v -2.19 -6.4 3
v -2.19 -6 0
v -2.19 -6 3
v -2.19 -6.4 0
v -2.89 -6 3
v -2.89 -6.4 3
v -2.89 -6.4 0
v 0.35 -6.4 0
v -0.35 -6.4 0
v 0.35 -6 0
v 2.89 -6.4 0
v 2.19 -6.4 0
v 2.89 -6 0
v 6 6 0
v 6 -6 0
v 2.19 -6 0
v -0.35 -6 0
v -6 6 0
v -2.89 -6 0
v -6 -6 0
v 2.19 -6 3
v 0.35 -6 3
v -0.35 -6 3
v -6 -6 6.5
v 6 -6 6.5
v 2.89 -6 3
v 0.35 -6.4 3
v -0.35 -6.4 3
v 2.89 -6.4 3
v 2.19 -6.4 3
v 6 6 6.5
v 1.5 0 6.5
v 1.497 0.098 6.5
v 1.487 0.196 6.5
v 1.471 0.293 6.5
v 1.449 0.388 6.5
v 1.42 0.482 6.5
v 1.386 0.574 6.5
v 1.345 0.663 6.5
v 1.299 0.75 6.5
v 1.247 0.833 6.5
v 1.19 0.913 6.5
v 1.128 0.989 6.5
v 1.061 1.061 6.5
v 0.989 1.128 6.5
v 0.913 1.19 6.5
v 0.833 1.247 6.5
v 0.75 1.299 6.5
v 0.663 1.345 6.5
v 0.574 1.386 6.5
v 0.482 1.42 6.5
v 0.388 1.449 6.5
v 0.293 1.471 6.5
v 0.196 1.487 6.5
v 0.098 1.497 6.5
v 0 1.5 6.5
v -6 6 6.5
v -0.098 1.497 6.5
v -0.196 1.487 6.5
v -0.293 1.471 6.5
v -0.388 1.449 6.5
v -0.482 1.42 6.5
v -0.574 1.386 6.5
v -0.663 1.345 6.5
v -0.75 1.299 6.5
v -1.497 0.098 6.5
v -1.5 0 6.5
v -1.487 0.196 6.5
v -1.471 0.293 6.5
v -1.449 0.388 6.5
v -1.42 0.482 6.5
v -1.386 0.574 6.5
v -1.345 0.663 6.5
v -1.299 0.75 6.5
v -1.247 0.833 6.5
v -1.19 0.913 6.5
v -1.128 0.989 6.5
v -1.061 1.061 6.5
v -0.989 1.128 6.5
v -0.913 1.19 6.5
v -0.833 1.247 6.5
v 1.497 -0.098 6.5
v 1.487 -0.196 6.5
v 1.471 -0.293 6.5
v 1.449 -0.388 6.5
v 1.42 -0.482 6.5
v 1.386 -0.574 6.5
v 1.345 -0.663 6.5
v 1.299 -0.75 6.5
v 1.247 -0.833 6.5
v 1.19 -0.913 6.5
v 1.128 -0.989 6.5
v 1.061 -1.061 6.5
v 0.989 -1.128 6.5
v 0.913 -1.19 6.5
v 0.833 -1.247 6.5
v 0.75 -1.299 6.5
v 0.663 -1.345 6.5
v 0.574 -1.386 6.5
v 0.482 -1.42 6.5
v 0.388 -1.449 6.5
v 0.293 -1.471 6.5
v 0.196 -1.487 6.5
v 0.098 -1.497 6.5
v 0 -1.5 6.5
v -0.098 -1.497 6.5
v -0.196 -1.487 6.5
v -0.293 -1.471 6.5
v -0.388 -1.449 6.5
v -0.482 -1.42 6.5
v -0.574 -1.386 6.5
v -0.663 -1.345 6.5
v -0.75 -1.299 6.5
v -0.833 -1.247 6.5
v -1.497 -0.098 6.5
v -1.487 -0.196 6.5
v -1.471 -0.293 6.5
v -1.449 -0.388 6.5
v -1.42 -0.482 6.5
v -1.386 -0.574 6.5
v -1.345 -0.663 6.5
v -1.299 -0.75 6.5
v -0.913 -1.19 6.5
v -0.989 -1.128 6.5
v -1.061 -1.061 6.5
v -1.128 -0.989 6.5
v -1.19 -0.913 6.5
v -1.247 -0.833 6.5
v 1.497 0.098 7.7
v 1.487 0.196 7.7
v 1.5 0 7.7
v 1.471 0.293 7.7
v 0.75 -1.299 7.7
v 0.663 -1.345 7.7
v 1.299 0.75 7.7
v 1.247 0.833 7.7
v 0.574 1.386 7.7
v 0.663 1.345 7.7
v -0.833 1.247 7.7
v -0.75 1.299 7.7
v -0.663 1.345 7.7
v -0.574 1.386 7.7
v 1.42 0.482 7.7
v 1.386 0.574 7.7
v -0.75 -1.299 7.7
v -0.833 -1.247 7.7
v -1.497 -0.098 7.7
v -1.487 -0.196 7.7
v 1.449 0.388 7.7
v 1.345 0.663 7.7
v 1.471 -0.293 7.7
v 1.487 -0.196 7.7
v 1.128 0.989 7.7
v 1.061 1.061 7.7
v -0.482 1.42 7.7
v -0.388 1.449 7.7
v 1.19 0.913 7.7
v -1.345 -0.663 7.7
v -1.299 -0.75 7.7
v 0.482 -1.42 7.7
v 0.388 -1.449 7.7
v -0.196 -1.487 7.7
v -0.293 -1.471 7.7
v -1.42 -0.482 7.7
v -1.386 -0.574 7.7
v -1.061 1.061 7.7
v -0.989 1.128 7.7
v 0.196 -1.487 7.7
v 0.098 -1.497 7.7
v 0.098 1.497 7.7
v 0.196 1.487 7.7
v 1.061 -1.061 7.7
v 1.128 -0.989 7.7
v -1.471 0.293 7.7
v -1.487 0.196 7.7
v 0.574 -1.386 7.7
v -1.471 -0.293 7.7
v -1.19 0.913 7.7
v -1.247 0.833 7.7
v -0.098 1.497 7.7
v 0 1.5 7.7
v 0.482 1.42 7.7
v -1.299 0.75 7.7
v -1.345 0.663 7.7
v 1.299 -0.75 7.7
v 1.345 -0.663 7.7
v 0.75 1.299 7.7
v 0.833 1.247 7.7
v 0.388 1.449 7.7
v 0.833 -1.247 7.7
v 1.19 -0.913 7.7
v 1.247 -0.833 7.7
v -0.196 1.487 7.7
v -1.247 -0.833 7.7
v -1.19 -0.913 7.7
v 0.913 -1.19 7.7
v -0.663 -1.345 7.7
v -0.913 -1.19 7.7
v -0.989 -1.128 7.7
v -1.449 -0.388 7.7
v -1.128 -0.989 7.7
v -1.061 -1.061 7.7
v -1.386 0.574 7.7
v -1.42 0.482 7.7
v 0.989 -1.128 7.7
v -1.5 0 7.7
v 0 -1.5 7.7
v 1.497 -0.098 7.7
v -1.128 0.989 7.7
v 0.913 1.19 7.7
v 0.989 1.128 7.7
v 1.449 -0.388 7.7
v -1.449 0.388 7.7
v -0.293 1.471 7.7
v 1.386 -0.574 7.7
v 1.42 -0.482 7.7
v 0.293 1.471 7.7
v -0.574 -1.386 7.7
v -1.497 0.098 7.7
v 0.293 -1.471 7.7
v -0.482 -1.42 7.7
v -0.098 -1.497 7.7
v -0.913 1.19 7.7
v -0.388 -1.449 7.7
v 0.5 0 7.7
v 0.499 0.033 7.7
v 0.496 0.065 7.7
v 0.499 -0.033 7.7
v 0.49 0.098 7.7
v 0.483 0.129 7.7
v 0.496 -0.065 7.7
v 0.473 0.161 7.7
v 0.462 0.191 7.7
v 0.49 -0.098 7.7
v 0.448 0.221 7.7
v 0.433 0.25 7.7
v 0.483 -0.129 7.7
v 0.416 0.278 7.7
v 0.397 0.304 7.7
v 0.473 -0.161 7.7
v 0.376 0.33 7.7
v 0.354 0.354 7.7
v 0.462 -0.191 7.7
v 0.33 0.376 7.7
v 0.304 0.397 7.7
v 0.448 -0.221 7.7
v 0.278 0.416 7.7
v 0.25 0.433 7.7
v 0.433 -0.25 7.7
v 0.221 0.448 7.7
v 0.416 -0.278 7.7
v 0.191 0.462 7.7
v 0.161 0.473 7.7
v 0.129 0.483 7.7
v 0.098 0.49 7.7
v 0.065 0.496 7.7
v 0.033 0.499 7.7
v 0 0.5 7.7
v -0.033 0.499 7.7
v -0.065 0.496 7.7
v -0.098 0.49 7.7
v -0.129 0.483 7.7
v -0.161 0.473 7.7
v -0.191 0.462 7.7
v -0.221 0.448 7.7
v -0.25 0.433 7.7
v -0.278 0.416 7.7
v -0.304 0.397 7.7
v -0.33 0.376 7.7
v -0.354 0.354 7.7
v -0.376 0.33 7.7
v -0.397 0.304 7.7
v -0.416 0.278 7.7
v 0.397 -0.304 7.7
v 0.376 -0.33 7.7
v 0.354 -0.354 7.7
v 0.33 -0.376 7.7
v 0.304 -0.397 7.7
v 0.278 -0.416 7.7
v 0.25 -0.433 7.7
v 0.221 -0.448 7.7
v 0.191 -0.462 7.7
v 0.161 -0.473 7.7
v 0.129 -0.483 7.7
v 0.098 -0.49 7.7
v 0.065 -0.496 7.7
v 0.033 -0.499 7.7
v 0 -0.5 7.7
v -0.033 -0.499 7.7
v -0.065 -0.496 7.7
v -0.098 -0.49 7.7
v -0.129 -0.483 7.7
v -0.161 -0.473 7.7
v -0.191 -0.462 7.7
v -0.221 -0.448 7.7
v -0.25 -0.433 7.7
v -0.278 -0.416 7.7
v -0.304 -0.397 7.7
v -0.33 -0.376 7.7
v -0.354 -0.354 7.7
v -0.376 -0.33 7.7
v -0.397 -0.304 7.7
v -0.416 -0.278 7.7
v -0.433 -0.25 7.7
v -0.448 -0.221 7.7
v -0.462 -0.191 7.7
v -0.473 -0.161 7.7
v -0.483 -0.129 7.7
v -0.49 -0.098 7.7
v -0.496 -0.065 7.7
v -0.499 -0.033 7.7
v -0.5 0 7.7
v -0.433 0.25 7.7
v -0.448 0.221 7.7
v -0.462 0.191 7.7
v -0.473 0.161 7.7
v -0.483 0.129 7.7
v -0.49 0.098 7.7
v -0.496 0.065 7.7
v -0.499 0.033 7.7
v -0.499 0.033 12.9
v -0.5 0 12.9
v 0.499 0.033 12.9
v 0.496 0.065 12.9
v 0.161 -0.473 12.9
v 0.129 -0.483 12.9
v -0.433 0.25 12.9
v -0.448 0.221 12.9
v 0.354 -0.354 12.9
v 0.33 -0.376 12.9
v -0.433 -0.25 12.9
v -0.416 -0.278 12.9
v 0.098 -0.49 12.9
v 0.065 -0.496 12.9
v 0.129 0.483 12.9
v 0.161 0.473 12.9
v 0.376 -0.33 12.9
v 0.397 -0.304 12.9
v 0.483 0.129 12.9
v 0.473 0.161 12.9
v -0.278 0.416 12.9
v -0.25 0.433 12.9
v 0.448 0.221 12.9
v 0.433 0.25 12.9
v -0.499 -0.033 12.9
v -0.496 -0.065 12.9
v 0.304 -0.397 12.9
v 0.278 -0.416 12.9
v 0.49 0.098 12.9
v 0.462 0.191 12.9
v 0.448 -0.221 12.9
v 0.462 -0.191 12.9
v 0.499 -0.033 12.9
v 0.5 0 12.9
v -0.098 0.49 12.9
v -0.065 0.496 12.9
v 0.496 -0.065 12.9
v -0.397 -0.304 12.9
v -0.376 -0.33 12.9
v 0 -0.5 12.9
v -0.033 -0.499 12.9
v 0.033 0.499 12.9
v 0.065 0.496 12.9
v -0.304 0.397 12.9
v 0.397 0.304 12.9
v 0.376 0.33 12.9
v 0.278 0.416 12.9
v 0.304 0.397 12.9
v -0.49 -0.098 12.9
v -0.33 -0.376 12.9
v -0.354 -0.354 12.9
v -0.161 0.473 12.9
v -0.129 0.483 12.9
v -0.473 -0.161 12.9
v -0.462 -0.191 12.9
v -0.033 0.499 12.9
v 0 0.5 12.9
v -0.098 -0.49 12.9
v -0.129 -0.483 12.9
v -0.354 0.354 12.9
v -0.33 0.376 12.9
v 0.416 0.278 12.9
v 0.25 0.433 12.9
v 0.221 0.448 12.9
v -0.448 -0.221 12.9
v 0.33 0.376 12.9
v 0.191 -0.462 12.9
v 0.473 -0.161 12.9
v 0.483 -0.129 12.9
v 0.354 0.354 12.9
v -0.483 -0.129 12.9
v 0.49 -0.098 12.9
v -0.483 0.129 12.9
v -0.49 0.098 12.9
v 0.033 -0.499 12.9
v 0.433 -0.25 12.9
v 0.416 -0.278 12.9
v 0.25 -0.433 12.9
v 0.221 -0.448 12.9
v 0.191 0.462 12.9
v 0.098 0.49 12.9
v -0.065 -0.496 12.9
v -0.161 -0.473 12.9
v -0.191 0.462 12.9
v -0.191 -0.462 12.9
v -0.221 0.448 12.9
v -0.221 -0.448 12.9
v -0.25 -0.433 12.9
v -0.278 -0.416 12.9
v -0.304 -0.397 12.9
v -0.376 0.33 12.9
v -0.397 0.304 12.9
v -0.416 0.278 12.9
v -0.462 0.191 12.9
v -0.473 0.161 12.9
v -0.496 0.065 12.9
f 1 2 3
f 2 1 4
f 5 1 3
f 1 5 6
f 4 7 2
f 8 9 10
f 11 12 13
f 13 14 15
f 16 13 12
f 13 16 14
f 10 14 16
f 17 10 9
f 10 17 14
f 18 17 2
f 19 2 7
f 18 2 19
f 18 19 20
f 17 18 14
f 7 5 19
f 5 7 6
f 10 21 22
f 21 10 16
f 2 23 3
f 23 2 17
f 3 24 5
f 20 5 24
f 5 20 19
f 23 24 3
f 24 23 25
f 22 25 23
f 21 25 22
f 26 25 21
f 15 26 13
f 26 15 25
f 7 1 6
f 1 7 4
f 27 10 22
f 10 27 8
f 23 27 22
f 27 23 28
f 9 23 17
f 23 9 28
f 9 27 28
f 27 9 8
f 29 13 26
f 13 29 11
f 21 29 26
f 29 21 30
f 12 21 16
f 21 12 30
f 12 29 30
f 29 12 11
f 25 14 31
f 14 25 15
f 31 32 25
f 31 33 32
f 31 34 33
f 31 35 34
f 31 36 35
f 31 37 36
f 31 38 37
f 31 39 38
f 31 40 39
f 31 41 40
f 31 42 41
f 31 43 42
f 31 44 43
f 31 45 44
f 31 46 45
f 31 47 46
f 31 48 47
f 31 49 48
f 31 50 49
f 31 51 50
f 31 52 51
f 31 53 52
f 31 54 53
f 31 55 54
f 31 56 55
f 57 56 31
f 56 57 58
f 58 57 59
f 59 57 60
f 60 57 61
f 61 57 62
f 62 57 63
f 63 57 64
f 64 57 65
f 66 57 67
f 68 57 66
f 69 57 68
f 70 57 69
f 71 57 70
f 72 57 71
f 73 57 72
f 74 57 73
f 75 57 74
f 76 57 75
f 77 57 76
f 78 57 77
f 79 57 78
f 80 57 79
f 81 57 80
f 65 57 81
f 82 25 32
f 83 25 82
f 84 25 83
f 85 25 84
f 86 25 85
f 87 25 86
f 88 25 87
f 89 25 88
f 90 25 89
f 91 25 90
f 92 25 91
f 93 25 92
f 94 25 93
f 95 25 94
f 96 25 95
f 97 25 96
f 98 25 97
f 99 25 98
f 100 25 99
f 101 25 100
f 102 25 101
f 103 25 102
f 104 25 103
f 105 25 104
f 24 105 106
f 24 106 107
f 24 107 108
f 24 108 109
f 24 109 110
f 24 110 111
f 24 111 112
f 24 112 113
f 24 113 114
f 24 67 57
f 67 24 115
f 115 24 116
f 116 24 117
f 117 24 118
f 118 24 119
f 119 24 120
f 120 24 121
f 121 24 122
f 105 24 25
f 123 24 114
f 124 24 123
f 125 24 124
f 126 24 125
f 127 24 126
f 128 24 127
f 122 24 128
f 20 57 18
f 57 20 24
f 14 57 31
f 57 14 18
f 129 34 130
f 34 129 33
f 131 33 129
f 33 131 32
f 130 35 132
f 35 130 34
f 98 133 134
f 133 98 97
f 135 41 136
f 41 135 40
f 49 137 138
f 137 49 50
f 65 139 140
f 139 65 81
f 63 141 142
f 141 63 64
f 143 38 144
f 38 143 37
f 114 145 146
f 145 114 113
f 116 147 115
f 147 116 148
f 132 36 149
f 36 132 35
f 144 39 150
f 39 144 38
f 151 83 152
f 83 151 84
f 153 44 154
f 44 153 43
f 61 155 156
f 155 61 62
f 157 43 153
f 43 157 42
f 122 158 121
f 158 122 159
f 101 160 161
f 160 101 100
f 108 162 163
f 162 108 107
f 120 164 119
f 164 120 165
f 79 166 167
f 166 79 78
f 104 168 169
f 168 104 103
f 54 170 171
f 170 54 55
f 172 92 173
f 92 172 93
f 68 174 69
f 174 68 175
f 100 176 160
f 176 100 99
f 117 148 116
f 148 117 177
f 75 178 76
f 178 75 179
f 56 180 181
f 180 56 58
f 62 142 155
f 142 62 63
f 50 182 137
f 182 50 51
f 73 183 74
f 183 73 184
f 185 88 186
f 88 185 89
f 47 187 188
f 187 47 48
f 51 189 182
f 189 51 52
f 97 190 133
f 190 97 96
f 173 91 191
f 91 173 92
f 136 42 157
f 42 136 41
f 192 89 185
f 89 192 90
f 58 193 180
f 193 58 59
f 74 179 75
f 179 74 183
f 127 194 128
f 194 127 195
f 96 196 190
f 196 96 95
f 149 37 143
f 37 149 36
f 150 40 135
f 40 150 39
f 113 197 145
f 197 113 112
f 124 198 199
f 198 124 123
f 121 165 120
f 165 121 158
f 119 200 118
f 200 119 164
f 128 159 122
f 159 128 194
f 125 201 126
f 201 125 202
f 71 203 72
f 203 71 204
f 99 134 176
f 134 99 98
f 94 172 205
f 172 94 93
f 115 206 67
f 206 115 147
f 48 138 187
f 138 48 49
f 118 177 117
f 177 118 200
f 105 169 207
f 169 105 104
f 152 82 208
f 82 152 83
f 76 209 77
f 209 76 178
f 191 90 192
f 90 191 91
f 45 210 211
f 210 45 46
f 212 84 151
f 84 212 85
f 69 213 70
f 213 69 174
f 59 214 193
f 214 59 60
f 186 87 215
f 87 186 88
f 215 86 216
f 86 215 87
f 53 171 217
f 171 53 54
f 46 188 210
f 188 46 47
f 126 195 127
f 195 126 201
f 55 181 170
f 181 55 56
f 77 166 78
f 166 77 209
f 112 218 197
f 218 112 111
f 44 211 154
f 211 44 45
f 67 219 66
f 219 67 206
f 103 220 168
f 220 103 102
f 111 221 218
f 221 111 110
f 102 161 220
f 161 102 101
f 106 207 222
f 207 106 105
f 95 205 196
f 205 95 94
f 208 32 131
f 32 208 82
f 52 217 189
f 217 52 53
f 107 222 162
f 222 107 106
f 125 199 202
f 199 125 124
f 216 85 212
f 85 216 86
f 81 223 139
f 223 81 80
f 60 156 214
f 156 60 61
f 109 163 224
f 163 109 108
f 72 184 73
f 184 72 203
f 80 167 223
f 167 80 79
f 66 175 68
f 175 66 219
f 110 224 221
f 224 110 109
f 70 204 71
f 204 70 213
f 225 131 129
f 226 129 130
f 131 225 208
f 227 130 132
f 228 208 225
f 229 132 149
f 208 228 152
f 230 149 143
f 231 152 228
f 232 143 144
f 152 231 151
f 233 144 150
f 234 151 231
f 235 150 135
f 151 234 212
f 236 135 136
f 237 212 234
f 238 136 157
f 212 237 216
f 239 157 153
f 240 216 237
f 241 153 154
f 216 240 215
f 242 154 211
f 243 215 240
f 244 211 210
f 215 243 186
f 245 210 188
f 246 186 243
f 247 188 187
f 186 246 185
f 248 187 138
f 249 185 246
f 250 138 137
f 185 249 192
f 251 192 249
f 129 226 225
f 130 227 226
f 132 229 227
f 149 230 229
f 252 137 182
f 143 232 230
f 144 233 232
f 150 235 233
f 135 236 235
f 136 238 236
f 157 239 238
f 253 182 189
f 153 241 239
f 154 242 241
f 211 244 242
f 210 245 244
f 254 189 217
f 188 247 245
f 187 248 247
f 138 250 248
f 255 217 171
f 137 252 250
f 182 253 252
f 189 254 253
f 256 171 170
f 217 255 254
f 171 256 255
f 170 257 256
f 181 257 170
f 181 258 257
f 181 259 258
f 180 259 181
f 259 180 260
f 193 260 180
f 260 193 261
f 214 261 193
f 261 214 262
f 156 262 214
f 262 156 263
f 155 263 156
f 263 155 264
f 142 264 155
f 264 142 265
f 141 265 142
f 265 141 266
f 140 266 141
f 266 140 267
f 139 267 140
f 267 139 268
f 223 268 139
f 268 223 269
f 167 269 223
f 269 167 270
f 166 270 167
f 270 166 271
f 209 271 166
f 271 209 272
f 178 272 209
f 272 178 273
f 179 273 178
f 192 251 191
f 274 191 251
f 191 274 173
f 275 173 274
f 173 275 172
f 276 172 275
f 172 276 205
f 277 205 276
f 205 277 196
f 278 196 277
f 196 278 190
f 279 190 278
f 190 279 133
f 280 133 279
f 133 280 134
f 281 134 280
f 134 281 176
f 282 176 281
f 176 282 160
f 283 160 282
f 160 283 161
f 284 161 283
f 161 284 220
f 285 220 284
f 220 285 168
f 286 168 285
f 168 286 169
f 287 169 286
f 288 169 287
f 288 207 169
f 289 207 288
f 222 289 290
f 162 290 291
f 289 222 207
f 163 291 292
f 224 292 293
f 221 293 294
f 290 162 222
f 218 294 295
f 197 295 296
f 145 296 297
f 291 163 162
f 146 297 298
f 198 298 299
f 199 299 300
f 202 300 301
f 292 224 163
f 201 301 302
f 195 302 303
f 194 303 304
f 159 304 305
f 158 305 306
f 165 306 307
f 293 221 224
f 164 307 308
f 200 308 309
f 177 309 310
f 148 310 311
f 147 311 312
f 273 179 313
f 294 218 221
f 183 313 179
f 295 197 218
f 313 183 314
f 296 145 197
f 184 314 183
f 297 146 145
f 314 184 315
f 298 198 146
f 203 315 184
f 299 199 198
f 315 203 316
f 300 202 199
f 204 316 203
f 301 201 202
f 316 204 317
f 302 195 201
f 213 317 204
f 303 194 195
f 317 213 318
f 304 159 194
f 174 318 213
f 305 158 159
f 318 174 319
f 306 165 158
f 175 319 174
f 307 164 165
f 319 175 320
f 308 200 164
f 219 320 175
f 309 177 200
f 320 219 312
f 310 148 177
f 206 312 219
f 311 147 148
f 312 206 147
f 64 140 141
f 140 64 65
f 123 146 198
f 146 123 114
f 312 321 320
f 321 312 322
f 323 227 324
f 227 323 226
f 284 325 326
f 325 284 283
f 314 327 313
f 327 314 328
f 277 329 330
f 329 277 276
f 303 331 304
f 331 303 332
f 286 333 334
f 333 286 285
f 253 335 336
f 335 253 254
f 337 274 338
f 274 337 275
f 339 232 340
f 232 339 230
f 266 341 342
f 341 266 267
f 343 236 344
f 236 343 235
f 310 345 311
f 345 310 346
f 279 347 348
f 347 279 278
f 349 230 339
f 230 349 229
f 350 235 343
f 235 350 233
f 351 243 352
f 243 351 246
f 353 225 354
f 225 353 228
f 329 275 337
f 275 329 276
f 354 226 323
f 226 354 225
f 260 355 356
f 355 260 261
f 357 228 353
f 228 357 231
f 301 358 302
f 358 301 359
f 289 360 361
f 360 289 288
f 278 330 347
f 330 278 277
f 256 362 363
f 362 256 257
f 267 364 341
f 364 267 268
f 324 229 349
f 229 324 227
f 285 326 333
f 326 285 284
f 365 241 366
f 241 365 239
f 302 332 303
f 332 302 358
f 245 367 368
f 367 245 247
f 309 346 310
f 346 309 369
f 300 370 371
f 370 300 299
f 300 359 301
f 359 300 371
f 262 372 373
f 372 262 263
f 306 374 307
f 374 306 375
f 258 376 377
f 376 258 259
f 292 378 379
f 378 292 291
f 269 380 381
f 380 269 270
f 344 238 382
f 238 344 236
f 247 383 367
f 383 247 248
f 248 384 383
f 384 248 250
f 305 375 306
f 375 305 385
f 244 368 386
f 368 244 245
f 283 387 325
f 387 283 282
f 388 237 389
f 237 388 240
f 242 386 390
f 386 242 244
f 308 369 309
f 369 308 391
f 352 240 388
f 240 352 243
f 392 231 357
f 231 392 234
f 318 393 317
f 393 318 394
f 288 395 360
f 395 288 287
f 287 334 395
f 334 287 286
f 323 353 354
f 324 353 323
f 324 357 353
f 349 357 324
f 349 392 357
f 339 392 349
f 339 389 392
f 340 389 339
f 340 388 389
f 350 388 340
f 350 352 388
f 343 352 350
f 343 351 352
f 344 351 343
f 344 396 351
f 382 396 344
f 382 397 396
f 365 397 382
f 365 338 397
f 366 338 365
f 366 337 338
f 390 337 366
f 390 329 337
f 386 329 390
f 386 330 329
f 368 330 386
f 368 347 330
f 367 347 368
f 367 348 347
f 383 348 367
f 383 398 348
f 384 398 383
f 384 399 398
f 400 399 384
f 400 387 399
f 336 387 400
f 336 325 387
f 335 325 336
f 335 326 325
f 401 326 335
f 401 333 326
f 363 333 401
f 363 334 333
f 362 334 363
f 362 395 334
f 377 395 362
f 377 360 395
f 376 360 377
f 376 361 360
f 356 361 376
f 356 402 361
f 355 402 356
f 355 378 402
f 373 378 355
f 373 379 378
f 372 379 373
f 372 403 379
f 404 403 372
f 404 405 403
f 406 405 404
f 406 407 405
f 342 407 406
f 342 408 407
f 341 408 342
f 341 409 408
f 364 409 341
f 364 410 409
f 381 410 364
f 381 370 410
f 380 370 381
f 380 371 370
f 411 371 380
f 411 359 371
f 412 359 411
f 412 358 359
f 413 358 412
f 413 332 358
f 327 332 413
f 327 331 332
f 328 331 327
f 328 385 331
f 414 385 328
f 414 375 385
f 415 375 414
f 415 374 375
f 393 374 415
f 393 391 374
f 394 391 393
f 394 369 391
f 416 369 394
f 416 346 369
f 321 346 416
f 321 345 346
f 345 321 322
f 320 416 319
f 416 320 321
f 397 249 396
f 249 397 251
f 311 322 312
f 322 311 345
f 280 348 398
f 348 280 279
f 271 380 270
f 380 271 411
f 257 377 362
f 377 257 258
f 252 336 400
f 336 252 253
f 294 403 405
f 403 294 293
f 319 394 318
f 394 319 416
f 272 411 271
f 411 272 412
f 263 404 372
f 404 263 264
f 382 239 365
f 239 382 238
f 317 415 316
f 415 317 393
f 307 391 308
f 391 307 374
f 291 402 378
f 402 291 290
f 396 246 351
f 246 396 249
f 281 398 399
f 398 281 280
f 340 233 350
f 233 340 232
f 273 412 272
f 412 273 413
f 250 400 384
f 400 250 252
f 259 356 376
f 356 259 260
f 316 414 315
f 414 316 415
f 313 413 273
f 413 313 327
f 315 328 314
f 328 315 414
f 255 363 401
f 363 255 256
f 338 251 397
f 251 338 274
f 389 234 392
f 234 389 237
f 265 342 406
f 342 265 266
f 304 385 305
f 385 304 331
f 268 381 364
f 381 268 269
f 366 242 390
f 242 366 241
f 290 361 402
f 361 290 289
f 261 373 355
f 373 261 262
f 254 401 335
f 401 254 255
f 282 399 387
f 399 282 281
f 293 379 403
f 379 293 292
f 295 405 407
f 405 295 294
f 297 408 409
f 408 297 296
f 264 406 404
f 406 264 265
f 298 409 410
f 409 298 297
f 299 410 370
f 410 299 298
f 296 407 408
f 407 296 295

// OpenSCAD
$fn = 96;

dims = [12, 12, 6.5, 1.0]; // [body_x, body_y, body_z, shaft_d]

body_x = dims[0];
body_y = dims[1];
body_z = dims[2];
shaft_d = dims[3];

shaft_h = max(4, body_z * 0.8);
shaft_z0 = body_z;

module potentiometer(body_x, body_y, body_z, shaft_d, shaft_h) {
    union() {
        // Main body
        translate([-body_x/2, -body_y/2, 0])
            cube([body_x, body_y, body_z], center=false);

        // Top collar (small boss)
        translate([0, 0, body_z])
            cylinder(d = max(shaft_d * 2.2, 3), h = max(1.2, body_z * 0.18), center=false);

        // Shaft
        translate([0, 0, body_z + max(1.2, body_z * 0.18)])
            cylinder(d = shaft_d, h = shaft_h, center=false);

        // Three pins on one side
        pin_w = 0.7;
        pin_t = 0.4;
        pin_h = 3.0;
        pin_spacing = 2.54;
        pin_y = -body_y/2 - pin_t;

        for (i = [-1, 0, 1]) {
            translate([i * pin_spacing - pin_w/2, pin_y, 0])
                cube([pin_w, pin_t, pin_h], center=false);
        }
    }
}

potentiometer(body_x, body_y, body_z, shaft_d, shaft_h);
